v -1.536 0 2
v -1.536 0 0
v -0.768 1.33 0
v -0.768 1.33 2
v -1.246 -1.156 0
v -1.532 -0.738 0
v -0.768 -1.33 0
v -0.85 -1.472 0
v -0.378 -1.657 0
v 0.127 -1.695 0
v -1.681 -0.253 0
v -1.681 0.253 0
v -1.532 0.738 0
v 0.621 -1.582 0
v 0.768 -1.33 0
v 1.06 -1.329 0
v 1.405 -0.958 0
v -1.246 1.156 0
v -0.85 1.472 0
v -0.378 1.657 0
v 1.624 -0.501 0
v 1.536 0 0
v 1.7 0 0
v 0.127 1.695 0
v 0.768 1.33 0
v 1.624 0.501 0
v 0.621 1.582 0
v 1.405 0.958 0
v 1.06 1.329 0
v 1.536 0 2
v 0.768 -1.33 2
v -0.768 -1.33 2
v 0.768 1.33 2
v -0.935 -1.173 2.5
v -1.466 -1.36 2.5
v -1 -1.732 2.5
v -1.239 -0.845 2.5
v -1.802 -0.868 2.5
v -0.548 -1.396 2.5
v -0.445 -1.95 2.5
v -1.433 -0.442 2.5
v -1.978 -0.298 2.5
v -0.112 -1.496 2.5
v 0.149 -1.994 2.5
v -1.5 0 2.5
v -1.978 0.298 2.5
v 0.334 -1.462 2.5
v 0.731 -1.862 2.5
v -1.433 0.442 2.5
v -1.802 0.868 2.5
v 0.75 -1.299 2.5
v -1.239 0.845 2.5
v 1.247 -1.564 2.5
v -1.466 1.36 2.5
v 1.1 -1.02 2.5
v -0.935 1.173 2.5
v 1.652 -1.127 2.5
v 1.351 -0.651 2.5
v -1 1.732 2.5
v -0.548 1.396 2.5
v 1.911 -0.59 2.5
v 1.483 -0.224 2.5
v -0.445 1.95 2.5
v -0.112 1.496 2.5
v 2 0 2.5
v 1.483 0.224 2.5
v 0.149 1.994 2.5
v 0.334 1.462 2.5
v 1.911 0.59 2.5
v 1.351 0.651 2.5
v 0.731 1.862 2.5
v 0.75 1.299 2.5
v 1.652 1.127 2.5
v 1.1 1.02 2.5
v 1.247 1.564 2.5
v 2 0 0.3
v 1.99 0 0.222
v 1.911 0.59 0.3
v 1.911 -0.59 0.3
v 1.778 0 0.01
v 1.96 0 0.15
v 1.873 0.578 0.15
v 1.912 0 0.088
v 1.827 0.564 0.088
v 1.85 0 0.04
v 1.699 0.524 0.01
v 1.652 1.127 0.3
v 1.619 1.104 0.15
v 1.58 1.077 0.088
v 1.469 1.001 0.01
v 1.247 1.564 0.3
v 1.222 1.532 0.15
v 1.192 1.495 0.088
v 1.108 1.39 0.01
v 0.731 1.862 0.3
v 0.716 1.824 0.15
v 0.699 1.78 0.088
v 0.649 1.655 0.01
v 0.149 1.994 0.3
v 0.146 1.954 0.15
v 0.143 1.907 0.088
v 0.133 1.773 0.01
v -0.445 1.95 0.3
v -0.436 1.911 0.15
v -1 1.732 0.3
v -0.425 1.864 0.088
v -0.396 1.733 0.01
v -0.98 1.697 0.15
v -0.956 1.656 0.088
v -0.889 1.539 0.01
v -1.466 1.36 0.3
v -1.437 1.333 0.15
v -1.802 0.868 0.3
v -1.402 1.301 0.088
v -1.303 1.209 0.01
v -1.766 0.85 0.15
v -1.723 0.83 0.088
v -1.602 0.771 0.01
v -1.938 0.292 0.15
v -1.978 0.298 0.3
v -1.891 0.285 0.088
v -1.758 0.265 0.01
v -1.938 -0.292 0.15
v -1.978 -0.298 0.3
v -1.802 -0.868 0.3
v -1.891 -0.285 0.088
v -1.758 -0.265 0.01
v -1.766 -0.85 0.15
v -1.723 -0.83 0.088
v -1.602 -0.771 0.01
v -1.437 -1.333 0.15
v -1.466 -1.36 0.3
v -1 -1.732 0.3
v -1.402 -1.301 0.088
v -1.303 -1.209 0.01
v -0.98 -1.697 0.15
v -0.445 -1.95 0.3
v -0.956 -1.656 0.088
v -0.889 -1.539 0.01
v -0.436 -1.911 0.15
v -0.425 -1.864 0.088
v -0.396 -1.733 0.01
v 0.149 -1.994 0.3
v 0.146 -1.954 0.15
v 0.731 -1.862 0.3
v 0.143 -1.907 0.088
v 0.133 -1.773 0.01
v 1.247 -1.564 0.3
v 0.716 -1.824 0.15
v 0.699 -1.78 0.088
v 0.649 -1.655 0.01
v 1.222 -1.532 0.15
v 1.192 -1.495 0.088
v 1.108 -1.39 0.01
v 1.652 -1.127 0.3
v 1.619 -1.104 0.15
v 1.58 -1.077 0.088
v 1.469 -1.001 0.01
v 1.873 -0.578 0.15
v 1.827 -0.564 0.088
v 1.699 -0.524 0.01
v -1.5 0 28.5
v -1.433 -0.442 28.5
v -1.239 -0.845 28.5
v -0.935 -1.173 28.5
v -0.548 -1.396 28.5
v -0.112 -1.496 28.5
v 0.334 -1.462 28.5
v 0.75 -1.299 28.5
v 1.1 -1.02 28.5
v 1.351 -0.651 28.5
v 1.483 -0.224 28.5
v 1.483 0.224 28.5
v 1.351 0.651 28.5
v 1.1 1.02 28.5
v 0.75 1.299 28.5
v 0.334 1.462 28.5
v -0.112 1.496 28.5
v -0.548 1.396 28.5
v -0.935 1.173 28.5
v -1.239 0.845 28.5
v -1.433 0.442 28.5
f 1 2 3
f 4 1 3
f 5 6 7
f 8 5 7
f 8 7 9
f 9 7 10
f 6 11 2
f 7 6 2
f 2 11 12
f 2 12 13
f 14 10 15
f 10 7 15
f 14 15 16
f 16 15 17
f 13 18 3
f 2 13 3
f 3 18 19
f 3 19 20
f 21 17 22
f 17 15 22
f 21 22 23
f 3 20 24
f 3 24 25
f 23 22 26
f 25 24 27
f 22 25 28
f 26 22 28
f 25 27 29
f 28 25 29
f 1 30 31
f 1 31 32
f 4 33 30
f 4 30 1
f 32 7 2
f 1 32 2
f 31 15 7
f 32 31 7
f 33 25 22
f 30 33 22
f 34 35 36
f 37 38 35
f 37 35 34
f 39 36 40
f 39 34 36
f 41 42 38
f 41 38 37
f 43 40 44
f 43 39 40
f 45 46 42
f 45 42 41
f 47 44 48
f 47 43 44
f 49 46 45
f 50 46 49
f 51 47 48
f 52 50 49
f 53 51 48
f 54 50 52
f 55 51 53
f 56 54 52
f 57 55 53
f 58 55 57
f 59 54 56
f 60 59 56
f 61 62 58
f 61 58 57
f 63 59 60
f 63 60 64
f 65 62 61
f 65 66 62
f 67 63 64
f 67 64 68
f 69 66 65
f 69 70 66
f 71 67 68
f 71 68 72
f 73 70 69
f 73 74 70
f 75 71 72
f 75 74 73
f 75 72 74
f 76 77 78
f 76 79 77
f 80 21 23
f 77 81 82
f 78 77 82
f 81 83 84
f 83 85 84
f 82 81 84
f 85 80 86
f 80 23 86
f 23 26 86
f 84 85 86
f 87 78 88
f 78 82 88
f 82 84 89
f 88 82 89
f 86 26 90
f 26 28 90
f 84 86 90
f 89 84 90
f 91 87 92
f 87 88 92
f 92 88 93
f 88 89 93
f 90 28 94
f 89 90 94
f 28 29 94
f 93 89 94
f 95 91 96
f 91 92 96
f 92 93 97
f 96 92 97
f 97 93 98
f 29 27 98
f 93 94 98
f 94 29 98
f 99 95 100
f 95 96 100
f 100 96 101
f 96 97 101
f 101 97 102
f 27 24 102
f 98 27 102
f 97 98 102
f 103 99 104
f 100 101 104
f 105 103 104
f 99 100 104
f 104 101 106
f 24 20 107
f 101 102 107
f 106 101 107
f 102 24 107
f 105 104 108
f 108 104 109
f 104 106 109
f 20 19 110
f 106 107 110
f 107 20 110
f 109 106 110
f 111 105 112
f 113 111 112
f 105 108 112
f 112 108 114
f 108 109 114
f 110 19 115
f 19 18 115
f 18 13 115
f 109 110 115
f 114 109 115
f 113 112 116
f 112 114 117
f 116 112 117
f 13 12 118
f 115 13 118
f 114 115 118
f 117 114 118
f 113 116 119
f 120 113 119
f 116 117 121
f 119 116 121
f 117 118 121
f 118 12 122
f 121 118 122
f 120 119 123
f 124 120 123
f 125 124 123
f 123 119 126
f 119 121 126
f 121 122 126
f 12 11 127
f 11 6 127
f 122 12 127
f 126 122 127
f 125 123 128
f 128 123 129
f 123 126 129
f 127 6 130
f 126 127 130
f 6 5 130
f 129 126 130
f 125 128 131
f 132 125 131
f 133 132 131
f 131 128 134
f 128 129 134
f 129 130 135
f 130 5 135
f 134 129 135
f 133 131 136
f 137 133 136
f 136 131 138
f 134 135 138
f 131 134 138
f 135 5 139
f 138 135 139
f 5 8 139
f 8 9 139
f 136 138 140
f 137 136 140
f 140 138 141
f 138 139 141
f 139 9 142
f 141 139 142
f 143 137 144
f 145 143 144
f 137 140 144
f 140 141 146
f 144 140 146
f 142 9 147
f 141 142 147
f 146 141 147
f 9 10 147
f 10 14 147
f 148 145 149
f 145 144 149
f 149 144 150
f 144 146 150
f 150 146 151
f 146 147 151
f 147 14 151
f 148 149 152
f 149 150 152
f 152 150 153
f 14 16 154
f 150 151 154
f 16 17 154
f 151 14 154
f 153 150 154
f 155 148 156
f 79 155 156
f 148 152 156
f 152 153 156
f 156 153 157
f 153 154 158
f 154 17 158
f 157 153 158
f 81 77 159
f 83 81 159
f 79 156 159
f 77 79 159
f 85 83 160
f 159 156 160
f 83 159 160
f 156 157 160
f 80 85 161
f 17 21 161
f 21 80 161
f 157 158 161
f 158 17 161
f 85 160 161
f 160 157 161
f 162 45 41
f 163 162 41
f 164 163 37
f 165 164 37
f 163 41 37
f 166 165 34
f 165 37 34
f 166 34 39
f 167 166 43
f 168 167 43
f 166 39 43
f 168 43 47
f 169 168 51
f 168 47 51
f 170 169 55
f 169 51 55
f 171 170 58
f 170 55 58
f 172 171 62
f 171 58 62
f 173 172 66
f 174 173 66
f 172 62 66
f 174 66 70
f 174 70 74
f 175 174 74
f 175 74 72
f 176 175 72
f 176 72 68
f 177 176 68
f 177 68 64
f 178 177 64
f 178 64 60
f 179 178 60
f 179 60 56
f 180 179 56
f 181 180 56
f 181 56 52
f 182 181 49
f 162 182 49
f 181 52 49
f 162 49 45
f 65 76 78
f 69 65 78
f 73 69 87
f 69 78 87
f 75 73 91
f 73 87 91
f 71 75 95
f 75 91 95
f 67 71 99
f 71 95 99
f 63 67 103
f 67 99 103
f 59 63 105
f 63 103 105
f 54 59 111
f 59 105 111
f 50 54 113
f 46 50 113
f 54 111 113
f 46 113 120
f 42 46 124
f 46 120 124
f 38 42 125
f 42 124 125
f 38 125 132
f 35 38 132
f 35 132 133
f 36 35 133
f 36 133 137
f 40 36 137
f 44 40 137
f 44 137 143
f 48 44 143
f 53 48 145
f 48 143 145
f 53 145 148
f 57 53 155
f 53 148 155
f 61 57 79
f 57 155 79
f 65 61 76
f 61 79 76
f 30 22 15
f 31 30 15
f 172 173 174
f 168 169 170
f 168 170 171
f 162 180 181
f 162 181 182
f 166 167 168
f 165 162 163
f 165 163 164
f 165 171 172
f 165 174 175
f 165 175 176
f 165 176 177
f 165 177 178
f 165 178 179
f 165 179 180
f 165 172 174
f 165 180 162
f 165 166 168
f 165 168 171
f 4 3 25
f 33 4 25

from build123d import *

# Parameters (mm, degrees)
ESQUISSE1_R             = 2
BASE_EXTRUSION_DEPTH    = 2.5
ESQUISSE2_R             = 1.5
BOSS_EXTRU_1_DEPTH      = 26
CONG_1_R                = 0.3
ENL_V_MAT_EXTRU_1_DEPTH = 2


with BuildPart() as part:
    # Esquisse1 → Base-Extrusion (new body)
    with BuildSketch(Plane.XY):
        Circle(ESQUISSE1_R)
    extrude(amount=BASE_EXTRUSION_DEPTH)

    # Esquisse2 → Boss.-Extru.1 (add)
    with BuildSketch(Plane.XY.offset(2.5)):
        with Locations(Location((0, 0, 0), (0, 0, 180))):
            Circle(ESQUISSE2_R)
    extrude(amount=BOSS_EXTRU_1_DEPTH)

    # Congé1
    cong_1_edges = [part.edges().sort_by_distance(p)[0] for p in [
        (-2, 0, 0),
    ]]
    fillet(cong_1_edges, radius=CONG_1_R)

    # Esquisse3 → Enlèv. mat.-Extru.1 (cut)
    with BuildSketch(Plane(origin=(0, 0, 0), x_dir=(-1, 0, 0), z_dir=(0, 0, -1))):
        Polygon((1.535751716, 0), (0.767875858, 1.33), (-0.767875858, 1.33), (-1.535751716, 0), (-0.767875858, -1.33), (0.767875858, -1.33), align=None)
    extrude(amount=-ENL_V_MAT_EXTRU_1_DEPTH, mode=Mode.SUBTRACT)


solid = part.part
